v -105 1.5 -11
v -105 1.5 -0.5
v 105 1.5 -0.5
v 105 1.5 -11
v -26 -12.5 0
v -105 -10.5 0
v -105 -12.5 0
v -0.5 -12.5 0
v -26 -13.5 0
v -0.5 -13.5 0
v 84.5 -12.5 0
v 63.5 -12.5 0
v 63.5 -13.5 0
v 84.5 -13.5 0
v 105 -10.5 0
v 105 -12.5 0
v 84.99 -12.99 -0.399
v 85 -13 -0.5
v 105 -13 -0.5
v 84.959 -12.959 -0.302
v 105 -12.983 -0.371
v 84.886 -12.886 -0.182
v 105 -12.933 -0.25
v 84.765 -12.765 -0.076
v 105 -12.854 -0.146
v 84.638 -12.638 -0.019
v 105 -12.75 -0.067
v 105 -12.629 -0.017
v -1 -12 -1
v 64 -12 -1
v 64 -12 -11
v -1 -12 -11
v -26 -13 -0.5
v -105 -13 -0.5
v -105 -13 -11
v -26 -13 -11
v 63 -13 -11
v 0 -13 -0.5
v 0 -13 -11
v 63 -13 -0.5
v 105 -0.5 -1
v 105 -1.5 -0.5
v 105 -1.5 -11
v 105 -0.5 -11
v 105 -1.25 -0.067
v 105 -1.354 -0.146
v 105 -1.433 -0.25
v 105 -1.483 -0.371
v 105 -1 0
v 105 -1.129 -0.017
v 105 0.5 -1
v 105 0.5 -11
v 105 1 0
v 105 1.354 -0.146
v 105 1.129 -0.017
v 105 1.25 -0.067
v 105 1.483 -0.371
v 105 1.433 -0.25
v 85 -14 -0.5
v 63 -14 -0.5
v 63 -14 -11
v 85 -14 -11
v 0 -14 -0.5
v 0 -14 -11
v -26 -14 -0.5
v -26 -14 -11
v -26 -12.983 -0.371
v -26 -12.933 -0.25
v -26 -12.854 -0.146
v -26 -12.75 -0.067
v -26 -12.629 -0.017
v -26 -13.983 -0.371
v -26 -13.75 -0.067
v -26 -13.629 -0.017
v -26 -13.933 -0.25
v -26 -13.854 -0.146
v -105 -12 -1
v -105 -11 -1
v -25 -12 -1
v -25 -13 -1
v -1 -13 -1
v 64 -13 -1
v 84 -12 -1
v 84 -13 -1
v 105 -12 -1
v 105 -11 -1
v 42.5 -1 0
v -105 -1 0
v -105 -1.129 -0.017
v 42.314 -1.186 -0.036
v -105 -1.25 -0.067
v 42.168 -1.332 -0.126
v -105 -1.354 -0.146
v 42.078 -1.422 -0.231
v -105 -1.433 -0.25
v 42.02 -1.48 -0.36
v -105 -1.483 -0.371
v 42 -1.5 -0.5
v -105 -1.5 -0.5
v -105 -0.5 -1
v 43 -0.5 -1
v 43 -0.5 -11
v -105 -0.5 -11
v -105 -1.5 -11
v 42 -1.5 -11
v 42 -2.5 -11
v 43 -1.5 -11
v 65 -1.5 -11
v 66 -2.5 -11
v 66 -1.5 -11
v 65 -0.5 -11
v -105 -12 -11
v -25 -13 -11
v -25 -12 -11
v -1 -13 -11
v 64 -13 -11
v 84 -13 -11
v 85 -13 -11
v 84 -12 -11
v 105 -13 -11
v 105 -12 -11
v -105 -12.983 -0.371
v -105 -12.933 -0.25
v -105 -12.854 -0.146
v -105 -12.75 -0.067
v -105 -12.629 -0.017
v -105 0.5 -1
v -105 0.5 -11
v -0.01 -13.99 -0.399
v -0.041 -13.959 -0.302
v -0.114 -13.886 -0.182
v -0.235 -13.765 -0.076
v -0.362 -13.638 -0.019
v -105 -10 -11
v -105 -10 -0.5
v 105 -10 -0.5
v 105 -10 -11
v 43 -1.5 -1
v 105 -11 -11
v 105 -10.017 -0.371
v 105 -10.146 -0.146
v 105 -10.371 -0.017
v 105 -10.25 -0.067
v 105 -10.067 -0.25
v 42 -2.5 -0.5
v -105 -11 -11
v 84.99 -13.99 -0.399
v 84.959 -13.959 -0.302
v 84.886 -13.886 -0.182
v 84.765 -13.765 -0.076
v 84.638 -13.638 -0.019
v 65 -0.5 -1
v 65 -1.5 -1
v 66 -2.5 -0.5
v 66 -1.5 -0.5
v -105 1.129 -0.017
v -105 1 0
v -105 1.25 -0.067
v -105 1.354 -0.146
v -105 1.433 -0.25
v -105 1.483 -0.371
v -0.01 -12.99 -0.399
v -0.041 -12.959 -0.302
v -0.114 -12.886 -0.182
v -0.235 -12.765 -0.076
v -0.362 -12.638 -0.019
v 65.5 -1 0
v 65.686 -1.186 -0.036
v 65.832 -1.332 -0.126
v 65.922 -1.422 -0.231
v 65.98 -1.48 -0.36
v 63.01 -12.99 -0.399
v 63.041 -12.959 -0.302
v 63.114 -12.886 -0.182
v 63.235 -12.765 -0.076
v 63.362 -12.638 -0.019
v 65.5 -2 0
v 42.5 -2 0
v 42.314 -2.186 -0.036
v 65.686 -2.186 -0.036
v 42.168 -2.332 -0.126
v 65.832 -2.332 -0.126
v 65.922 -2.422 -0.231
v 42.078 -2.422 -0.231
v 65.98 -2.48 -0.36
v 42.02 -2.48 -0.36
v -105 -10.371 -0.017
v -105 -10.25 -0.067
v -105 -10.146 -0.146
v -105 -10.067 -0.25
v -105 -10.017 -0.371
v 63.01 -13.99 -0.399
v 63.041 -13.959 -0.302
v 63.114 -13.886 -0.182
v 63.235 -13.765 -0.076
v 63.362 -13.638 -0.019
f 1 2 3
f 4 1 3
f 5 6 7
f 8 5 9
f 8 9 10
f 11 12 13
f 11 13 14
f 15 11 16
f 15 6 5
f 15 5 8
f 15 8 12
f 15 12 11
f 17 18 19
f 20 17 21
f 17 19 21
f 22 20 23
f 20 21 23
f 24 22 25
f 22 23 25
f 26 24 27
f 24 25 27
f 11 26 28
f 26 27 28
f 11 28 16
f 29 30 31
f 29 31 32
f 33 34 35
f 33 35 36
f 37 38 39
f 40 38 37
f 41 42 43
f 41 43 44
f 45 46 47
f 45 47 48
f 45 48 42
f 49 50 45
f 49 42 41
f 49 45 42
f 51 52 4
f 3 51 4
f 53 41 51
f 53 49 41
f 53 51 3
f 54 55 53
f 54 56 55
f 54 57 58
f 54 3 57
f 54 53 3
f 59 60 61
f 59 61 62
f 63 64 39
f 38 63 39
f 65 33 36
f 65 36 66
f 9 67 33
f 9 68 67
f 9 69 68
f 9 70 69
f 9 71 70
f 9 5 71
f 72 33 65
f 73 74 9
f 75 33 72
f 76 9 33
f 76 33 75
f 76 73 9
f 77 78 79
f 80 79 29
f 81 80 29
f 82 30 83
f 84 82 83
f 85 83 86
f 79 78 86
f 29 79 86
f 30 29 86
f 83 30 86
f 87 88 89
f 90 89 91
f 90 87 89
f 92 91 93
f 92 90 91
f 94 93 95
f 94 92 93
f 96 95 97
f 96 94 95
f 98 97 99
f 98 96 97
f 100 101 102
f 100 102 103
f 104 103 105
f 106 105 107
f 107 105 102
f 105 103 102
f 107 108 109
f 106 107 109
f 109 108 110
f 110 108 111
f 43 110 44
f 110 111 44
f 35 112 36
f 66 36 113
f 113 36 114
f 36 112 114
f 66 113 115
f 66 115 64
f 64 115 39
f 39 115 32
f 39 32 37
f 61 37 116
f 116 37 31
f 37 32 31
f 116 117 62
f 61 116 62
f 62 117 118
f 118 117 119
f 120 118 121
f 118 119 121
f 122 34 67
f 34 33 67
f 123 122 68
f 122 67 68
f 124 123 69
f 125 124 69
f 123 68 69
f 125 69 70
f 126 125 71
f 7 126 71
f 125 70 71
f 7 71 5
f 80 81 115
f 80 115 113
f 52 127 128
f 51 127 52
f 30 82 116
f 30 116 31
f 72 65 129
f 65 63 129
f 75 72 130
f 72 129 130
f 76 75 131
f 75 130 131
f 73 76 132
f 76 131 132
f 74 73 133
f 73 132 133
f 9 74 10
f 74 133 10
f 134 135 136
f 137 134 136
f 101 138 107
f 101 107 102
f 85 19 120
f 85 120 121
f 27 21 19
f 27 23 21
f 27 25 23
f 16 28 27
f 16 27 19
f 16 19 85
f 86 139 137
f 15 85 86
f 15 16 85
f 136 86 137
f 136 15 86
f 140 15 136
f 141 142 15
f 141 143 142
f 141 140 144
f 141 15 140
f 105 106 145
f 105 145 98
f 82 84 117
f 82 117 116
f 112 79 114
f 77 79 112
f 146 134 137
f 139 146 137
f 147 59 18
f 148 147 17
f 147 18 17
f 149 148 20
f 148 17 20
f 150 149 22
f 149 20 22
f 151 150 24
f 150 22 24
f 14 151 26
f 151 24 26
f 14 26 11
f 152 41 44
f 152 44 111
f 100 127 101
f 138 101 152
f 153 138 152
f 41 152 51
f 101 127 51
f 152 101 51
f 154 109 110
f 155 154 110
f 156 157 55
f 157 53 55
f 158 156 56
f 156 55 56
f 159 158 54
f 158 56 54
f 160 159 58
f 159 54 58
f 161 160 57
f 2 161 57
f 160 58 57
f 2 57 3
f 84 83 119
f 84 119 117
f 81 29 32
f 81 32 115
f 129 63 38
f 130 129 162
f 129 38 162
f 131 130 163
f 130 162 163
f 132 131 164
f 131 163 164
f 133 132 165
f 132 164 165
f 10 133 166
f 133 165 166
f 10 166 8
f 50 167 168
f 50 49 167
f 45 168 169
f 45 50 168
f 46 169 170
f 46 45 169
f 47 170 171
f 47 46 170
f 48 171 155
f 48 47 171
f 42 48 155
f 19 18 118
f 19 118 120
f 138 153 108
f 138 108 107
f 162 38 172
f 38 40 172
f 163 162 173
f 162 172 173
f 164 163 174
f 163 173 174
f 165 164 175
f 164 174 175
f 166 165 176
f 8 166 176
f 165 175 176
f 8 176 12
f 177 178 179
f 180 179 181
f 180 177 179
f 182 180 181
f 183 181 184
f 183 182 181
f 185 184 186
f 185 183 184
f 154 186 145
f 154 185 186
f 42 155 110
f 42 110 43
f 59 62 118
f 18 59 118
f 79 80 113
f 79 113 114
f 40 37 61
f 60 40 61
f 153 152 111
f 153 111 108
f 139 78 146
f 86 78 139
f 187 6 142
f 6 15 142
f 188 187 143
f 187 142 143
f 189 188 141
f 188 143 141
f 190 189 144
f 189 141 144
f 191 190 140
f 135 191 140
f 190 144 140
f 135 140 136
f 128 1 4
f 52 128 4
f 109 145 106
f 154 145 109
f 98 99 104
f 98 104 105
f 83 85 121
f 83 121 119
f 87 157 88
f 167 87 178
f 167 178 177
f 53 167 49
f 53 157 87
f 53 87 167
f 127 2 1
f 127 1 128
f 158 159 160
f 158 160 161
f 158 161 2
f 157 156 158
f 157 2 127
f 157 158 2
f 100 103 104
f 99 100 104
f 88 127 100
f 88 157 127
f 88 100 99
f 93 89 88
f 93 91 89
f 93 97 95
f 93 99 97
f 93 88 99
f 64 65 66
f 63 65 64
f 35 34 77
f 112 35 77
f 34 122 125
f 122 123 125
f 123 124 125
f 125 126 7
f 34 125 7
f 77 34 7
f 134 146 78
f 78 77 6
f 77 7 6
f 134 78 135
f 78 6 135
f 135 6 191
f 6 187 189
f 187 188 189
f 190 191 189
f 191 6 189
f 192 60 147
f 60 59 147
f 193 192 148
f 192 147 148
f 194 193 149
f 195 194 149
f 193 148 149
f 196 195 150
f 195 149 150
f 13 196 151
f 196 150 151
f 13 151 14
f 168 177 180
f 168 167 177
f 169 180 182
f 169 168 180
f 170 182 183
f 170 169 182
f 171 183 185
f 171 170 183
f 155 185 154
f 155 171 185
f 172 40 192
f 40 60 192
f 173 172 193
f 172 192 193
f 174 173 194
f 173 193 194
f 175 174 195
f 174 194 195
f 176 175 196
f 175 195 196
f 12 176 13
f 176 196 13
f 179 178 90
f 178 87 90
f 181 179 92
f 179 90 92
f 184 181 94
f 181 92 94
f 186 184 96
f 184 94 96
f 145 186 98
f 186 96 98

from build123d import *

# Parameters (mm, degrees)
F1_W     = 20
F1_H     = 1
F1_W_2   = 24
F2_DEPTH = 1
F1_W_3   = 210
F3_DEPTH = 11
F0_W     = 22
F0_H     = 1
F4_DEPTH = 1
F0_W_2   = 1
F0_W_3   = 210
F5_DEPTH = 11
F6_R     = 0.5
F6_2_R   = 0.5


with BuildPart() as f2:
    # F1 (on Top) → F2 (new body)
    with BuildSketch(Plane.XY):
        Polygon((105, -11), (-105, -11), (-105, -12), (-25, -12), (-1, -12), (64, -12), (84, -12), (105, -12), align=None)
        with Locations((74, -12.5)):
            Rectangle(F1_W, F1_H)
        with Locations((-13, -12.5)):
            Rectangle(F1_W_2, F1_H)
    extrude(amount=-F2_DEPTH)

    # F1 (on Top) → F3 (join)
    with BuildSketch(Plane.XY):
        with Locations((0, -10.5)):
            Rectangle(F1_W_3, F1_H)
        Polygon((-25, -13), (-26, -13), (-26, -14), (0, -14), (0, -13), (-1, -13), align=None)
        Polygon((-25, -12), (-105, -12), (-105, -13), (-26, -13), (-25, -13), align=None)
        Polygon((64, -12), (-1, -12), (-1, -13), (0, -13), (63, -13), (64, -13), align=None)
        Polygon((85, -14), (85, -13), (84, -13), (64, -13), (63, -13), (63, -14), align=None)
        Polygon((105, -13), (105, -12), (84, -12), (84, -13), (85, -13), align=None)
    extrude(amount=-F3_DEPTH)

    # F6
    f6_edges = [f2.edges().sort_by_distance(p)[0] for p in [
        (0, -10, 0),
        (-13, -14, 0),
        (0, -13.5, 0),
        (63, -13.5, 0),
        (74, -14, 0),
        (85, -13.5, 0),
        (95, -13, 0),
        (-65.5, -13, 0),
        (31.5, -13, 0),
    ]]
    fillet(f6_edges, radius=F6_R)


with BuildPart() as f4:
    # F0 (on Top) → F4 (new body)
    with BuildSketch(Plane.XY):
        Polygon((105, 0.5), (-105, 0.5), (-105, -0.5), (43, -0.5), (65, -0.5), (105, -0.5), align=None)
        with Locations((54, -1)):
            Rectangle(F0_W, F0_H)
    extrude(amount=-F4_DEPTH)

    # F0 (on Top) → F5 (join)
    with BuildSketch(Plane.XY):
        with Locations((54, -2)):
            Rectangle(F0_W, F0_H)
        with Locations((42.5, -2)):
            Rectangle(F0_W_2, F0_H)
        Polygon((43, -0.5), (-105, -0.5), (-105, -1.5), (42, -1.5), (43, -1.5), align=None)
        with Locations((65.5, -2)):
            Rectangle(F0_W_2, F0_H)
        Polygon((105, -1.5), (105, -0.5), (65, -0.5), (65, -1.5), (66, -1.5), align=None)
        with Locations((0, 1)):
            Rectangle(F0_W_3, F0_H)
    extrude(amount=-F5_DEPTH)

    # F6#2
    f6_2_edges = [f4.edges().sort_by_distance(p)[0] for p in [
        (0, 1.5, 0),
        (-31.5, -1.5, 0),
        (54, -2.5, 0),
        (85.5, -1.5, 0),
        (42, -2, 0),
        (66, -2, 0),
    ]]
    fillet(f6_2_edges, radius=F6_2_R)


solid = Compound([f2.part, f4.part])
